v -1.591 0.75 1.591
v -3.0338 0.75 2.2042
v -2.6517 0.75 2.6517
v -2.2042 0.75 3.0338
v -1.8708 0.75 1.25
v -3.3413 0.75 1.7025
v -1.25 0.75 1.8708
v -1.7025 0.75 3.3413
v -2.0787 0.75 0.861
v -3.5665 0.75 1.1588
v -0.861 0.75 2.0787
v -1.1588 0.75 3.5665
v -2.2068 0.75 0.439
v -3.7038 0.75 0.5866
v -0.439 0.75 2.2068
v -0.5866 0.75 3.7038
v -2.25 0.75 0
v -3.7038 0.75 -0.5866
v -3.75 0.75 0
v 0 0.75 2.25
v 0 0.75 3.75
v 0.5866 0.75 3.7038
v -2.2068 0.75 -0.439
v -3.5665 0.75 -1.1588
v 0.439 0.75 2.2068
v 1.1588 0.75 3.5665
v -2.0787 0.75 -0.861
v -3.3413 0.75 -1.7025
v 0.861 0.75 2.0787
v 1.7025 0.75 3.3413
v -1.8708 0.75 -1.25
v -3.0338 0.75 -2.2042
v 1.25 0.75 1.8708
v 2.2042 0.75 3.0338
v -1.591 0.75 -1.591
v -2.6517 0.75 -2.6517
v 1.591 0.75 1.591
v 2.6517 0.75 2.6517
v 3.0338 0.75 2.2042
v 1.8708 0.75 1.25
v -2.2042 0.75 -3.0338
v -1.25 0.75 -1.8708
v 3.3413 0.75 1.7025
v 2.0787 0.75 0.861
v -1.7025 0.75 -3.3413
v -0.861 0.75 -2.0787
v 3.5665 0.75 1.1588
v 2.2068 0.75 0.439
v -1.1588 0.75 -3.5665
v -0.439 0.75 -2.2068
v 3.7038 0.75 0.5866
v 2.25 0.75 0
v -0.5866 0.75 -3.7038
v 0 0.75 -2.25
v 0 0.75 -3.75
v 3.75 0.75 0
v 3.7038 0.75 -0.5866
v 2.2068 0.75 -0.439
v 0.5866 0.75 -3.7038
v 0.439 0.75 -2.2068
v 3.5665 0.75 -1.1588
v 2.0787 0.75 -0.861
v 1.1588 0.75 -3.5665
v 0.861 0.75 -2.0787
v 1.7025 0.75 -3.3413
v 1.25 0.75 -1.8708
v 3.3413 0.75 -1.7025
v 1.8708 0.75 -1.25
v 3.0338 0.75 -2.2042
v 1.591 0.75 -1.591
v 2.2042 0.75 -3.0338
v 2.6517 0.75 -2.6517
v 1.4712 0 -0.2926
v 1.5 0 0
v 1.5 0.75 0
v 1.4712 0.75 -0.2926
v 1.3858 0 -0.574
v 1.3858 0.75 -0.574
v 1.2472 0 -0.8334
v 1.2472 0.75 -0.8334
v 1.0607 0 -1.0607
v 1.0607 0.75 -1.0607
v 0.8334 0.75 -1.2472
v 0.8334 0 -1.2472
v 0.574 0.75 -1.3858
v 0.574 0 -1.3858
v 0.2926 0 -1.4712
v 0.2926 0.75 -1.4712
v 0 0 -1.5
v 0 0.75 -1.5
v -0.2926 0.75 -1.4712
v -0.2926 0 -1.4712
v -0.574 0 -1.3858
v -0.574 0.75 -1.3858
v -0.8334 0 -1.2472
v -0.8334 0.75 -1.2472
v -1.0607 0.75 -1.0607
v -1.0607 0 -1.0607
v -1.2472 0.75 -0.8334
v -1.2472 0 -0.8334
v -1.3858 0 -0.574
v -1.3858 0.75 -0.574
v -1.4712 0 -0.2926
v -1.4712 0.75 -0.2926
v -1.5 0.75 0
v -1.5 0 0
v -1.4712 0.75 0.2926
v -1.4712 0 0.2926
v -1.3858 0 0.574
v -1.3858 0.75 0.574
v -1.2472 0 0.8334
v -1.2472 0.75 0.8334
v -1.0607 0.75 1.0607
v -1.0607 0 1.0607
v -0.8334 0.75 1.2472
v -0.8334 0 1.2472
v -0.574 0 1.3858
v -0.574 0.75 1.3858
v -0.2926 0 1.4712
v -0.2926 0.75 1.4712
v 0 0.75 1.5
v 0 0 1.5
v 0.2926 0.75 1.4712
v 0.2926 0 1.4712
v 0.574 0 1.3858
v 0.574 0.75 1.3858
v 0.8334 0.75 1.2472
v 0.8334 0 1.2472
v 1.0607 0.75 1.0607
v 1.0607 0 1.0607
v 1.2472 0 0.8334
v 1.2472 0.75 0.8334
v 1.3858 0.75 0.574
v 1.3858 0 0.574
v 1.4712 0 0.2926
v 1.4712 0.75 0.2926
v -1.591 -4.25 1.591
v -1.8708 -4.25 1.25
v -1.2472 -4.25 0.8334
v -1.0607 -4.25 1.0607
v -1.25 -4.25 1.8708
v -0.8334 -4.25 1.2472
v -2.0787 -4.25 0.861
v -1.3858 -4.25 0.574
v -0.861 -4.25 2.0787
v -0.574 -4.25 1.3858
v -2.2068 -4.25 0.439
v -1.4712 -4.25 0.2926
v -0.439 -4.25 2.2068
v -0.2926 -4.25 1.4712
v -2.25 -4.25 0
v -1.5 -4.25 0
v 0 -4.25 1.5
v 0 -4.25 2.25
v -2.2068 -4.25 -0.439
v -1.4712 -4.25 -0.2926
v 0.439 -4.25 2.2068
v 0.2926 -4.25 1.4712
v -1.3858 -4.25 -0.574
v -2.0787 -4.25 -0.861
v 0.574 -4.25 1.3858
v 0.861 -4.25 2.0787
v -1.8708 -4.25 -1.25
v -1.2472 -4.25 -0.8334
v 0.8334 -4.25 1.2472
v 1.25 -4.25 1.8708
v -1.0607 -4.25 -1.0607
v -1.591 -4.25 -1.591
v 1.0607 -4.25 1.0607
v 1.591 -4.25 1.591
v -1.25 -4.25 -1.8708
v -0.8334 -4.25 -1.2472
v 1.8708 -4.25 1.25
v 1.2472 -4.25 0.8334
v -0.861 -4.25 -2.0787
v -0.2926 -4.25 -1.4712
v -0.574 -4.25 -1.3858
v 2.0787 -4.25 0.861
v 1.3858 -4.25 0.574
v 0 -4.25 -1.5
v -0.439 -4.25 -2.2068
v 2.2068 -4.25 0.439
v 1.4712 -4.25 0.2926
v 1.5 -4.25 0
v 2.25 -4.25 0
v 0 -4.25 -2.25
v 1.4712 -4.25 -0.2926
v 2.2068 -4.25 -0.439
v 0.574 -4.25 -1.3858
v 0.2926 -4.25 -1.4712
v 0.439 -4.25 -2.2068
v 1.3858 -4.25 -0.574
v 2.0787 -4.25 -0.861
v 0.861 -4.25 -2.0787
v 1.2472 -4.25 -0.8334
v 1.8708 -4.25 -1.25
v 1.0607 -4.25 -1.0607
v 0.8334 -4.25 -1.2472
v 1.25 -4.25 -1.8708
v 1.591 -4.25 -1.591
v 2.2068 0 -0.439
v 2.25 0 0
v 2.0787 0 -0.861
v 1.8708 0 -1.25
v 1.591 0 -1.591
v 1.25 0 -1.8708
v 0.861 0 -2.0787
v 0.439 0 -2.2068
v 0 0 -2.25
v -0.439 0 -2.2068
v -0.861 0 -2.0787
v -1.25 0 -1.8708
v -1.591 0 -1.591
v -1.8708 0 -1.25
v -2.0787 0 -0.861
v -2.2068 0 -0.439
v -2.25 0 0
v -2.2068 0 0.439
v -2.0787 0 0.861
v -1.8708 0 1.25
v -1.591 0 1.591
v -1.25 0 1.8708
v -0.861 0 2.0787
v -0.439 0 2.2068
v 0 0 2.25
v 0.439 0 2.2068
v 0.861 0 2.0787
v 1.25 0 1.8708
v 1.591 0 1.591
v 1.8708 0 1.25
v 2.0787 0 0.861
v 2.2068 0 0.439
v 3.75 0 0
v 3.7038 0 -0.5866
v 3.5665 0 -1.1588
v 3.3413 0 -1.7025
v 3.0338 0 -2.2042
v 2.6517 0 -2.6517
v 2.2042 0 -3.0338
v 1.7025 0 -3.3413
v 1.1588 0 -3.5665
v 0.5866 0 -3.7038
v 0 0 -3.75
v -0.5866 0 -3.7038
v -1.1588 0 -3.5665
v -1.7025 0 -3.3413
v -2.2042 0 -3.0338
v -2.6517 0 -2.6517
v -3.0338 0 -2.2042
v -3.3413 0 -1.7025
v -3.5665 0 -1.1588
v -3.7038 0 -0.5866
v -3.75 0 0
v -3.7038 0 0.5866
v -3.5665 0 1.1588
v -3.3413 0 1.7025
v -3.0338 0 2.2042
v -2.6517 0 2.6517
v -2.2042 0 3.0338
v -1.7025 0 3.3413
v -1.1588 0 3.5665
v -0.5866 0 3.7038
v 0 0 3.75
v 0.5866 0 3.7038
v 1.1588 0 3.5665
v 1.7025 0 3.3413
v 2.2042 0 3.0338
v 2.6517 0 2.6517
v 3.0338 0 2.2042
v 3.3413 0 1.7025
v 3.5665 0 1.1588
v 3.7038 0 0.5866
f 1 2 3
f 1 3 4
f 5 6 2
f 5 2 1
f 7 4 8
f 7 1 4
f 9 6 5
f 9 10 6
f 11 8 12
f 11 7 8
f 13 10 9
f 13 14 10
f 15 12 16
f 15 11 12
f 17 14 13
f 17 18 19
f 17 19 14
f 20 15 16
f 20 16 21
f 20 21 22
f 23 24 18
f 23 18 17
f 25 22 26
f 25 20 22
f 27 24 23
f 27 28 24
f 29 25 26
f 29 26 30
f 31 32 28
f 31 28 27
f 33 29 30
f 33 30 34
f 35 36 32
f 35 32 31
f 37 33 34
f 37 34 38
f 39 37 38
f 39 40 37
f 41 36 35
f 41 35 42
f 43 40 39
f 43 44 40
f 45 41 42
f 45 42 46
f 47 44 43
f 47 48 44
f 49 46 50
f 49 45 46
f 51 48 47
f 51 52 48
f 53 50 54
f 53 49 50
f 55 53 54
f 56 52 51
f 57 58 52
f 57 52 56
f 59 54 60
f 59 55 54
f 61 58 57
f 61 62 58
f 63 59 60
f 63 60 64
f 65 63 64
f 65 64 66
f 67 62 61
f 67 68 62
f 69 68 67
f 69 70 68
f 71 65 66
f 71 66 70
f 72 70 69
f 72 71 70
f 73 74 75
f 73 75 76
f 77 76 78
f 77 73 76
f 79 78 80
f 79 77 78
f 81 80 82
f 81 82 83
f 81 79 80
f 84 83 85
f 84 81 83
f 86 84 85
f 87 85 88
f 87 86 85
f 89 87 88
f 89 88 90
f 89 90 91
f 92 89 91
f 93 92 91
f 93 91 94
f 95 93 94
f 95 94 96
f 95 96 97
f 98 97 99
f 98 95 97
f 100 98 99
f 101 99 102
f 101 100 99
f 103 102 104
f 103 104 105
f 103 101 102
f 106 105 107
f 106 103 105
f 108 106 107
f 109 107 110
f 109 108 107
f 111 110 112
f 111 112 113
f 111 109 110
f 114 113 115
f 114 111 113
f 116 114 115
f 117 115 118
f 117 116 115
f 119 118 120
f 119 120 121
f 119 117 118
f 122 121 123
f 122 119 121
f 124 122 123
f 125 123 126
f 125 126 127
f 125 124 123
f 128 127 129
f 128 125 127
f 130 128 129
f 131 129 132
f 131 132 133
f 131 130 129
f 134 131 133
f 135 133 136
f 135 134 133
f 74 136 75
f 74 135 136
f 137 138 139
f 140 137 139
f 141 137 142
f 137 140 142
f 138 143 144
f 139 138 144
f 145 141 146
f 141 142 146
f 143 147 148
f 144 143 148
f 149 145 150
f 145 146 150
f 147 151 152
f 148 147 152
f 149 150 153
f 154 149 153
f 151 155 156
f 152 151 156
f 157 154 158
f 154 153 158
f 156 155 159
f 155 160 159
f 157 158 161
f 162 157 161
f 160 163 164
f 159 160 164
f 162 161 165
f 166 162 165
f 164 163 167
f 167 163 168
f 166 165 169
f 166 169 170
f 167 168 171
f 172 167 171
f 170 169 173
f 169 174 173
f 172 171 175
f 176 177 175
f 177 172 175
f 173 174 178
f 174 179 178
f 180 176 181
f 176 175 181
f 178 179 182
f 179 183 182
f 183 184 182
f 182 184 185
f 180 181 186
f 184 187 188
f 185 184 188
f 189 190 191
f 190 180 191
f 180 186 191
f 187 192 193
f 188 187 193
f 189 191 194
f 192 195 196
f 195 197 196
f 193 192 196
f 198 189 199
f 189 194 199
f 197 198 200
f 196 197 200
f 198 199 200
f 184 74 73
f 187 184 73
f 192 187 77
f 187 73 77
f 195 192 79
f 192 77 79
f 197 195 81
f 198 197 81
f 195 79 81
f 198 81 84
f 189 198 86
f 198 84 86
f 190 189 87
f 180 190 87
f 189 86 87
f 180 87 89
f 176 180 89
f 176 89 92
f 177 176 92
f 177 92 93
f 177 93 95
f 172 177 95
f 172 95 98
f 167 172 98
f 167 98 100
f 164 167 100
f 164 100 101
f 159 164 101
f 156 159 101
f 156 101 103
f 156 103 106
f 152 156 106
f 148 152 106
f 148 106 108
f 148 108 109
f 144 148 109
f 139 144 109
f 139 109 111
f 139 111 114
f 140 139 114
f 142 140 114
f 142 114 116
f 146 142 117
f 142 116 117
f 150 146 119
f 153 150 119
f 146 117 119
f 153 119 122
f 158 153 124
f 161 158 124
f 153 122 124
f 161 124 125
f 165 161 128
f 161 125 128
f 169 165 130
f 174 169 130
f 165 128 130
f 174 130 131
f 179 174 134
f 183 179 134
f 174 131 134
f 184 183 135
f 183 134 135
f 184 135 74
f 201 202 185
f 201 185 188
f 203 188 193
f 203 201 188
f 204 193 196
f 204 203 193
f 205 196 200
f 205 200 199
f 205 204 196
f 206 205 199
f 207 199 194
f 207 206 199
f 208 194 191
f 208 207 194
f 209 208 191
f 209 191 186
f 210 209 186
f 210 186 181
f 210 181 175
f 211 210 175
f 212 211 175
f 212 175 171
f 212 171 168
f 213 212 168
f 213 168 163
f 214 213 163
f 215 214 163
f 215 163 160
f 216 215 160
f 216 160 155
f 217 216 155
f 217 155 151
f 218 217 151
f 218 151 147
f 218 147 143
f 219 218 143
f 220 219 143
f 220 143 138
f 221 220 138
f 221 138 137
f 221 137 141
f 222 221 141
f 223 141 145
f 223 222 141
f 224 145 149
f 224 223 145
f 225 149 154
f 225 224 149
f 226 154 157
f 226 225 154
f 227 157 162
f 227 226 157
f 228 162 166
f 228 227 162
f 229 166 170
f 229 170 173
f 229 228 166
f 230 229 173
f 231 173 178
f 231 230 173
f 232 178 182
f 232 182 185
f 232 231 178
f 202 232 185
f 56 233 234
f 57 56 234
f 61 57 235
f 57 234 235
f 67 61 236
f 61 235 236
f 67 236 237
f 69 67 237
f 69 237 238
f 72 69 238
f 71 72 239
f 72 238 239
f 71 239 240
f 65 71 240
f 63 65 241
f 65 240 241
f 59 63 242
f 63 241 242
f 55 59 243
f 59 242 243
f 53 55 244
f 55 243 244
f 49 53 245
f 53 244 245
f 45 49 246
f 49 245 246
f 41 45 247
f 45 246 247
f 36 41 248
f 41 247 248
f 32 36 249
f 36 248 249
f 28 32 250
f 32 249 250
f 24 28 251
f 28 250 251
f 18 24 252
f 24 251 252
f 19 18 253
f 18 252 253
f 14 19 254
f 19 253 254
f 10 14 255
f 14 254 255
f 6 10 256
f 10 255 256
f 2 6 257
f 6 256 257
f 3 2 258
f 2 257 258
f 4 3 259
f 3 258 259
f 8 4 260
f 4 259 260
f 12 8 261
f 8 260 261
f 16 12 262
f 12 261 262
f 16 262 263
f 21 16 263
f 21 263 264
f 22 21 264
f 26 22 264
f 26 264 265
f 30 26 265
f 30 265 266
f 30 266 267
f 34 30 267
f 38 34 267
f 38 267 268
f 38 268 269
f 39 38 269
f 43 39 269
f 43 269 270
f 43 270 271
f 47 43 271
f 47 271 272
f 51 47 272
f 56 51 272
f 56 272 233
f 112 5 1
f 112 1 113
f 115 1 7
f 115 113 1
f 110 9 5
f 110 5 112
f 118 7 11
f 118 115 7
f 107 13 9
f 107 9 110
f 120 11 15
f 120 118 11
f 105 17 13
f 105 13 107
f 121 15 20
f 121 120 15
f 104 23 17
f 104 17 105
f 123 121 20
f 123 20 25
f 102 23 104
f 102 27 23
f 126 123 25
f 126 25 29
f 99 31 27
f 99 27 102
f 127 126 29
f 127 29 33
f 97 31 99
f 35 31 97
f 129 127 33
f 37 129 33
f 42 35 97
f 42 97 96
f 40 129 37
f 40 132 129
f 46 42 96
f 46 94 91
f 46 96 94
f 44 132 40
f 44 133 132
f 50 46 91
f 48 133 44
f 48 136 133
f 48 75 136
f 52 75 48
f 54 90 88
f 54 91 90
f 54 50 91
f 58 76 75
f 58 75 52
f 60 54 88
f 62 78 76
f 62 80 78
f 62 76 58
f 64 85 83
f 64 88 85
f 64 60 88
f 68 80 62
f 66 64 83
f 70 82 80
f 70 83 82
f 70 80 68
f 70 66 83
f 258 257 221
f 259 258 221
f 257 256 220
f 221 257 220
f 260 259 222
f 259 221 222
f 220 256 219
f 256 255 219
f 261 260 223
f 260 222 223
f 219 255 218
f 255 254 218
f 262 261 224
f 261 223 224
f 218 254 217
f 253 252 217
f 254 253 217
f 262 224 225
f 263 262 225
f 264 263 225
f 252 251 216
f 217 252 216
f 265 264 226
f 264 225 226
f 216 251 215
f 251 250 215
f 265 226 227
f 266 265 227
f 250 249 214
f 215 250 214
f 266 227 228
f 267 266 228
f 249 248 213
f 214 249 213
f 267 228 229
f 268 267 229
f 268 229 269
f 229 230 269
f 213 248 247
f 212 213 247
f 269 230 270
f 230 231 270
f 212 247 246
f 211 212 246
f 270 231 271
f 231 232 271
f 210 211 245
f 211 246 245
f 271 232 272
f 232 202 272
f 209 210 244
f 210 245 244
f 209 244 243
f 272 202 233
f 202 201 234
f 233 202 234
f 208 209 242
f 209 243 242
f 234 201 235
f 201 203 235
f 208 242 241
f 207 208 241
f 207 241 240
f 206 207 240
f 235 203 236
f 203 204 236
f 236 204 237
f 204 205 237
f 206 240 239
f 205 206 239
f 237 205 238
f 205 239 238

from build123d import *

# Parameters (mm, degrees)
SKETCH1_R           = 3.75
SKETCH1_R_2         = 1.5
BOSS_EXTRUDE1_DEPTH = 0.75
SKETCH2_R           = 2.25
SKETCH2_R_2         = 1.5
BOSS_EXTRUDE2_DEPTH = 5


with BuildPart() as part:
    # Sketch1 → Boss-Extrude1 (new body)
    with BuildSketch(Plane(origin=(0, 0, 0), x_dir=(1, 0, 0), z_dir=(0, 1, 0))):
        Circle(SKETCH1_R)
        Circle(SKETCH1_R_2, mode=Mode.SUBTRACT)
    extrude(amount=BOSS_EXTRUDE1_DEPTH)

    # Sketch2 → Boss-Extrude2 (add)
    with BuildSketch(Plane(origin=(0, 0.75, 0), x_dir=(1, 0, 0), z_dir=(0, 1, 0))):
        Circle(SKETCH2_R)
        Circle(SKETCH2_R_2, mode=Mode.SUBTRACT)
    extrude(amount=-BOSS_EXTRUDE2_DEPTH)


solid = part.part
